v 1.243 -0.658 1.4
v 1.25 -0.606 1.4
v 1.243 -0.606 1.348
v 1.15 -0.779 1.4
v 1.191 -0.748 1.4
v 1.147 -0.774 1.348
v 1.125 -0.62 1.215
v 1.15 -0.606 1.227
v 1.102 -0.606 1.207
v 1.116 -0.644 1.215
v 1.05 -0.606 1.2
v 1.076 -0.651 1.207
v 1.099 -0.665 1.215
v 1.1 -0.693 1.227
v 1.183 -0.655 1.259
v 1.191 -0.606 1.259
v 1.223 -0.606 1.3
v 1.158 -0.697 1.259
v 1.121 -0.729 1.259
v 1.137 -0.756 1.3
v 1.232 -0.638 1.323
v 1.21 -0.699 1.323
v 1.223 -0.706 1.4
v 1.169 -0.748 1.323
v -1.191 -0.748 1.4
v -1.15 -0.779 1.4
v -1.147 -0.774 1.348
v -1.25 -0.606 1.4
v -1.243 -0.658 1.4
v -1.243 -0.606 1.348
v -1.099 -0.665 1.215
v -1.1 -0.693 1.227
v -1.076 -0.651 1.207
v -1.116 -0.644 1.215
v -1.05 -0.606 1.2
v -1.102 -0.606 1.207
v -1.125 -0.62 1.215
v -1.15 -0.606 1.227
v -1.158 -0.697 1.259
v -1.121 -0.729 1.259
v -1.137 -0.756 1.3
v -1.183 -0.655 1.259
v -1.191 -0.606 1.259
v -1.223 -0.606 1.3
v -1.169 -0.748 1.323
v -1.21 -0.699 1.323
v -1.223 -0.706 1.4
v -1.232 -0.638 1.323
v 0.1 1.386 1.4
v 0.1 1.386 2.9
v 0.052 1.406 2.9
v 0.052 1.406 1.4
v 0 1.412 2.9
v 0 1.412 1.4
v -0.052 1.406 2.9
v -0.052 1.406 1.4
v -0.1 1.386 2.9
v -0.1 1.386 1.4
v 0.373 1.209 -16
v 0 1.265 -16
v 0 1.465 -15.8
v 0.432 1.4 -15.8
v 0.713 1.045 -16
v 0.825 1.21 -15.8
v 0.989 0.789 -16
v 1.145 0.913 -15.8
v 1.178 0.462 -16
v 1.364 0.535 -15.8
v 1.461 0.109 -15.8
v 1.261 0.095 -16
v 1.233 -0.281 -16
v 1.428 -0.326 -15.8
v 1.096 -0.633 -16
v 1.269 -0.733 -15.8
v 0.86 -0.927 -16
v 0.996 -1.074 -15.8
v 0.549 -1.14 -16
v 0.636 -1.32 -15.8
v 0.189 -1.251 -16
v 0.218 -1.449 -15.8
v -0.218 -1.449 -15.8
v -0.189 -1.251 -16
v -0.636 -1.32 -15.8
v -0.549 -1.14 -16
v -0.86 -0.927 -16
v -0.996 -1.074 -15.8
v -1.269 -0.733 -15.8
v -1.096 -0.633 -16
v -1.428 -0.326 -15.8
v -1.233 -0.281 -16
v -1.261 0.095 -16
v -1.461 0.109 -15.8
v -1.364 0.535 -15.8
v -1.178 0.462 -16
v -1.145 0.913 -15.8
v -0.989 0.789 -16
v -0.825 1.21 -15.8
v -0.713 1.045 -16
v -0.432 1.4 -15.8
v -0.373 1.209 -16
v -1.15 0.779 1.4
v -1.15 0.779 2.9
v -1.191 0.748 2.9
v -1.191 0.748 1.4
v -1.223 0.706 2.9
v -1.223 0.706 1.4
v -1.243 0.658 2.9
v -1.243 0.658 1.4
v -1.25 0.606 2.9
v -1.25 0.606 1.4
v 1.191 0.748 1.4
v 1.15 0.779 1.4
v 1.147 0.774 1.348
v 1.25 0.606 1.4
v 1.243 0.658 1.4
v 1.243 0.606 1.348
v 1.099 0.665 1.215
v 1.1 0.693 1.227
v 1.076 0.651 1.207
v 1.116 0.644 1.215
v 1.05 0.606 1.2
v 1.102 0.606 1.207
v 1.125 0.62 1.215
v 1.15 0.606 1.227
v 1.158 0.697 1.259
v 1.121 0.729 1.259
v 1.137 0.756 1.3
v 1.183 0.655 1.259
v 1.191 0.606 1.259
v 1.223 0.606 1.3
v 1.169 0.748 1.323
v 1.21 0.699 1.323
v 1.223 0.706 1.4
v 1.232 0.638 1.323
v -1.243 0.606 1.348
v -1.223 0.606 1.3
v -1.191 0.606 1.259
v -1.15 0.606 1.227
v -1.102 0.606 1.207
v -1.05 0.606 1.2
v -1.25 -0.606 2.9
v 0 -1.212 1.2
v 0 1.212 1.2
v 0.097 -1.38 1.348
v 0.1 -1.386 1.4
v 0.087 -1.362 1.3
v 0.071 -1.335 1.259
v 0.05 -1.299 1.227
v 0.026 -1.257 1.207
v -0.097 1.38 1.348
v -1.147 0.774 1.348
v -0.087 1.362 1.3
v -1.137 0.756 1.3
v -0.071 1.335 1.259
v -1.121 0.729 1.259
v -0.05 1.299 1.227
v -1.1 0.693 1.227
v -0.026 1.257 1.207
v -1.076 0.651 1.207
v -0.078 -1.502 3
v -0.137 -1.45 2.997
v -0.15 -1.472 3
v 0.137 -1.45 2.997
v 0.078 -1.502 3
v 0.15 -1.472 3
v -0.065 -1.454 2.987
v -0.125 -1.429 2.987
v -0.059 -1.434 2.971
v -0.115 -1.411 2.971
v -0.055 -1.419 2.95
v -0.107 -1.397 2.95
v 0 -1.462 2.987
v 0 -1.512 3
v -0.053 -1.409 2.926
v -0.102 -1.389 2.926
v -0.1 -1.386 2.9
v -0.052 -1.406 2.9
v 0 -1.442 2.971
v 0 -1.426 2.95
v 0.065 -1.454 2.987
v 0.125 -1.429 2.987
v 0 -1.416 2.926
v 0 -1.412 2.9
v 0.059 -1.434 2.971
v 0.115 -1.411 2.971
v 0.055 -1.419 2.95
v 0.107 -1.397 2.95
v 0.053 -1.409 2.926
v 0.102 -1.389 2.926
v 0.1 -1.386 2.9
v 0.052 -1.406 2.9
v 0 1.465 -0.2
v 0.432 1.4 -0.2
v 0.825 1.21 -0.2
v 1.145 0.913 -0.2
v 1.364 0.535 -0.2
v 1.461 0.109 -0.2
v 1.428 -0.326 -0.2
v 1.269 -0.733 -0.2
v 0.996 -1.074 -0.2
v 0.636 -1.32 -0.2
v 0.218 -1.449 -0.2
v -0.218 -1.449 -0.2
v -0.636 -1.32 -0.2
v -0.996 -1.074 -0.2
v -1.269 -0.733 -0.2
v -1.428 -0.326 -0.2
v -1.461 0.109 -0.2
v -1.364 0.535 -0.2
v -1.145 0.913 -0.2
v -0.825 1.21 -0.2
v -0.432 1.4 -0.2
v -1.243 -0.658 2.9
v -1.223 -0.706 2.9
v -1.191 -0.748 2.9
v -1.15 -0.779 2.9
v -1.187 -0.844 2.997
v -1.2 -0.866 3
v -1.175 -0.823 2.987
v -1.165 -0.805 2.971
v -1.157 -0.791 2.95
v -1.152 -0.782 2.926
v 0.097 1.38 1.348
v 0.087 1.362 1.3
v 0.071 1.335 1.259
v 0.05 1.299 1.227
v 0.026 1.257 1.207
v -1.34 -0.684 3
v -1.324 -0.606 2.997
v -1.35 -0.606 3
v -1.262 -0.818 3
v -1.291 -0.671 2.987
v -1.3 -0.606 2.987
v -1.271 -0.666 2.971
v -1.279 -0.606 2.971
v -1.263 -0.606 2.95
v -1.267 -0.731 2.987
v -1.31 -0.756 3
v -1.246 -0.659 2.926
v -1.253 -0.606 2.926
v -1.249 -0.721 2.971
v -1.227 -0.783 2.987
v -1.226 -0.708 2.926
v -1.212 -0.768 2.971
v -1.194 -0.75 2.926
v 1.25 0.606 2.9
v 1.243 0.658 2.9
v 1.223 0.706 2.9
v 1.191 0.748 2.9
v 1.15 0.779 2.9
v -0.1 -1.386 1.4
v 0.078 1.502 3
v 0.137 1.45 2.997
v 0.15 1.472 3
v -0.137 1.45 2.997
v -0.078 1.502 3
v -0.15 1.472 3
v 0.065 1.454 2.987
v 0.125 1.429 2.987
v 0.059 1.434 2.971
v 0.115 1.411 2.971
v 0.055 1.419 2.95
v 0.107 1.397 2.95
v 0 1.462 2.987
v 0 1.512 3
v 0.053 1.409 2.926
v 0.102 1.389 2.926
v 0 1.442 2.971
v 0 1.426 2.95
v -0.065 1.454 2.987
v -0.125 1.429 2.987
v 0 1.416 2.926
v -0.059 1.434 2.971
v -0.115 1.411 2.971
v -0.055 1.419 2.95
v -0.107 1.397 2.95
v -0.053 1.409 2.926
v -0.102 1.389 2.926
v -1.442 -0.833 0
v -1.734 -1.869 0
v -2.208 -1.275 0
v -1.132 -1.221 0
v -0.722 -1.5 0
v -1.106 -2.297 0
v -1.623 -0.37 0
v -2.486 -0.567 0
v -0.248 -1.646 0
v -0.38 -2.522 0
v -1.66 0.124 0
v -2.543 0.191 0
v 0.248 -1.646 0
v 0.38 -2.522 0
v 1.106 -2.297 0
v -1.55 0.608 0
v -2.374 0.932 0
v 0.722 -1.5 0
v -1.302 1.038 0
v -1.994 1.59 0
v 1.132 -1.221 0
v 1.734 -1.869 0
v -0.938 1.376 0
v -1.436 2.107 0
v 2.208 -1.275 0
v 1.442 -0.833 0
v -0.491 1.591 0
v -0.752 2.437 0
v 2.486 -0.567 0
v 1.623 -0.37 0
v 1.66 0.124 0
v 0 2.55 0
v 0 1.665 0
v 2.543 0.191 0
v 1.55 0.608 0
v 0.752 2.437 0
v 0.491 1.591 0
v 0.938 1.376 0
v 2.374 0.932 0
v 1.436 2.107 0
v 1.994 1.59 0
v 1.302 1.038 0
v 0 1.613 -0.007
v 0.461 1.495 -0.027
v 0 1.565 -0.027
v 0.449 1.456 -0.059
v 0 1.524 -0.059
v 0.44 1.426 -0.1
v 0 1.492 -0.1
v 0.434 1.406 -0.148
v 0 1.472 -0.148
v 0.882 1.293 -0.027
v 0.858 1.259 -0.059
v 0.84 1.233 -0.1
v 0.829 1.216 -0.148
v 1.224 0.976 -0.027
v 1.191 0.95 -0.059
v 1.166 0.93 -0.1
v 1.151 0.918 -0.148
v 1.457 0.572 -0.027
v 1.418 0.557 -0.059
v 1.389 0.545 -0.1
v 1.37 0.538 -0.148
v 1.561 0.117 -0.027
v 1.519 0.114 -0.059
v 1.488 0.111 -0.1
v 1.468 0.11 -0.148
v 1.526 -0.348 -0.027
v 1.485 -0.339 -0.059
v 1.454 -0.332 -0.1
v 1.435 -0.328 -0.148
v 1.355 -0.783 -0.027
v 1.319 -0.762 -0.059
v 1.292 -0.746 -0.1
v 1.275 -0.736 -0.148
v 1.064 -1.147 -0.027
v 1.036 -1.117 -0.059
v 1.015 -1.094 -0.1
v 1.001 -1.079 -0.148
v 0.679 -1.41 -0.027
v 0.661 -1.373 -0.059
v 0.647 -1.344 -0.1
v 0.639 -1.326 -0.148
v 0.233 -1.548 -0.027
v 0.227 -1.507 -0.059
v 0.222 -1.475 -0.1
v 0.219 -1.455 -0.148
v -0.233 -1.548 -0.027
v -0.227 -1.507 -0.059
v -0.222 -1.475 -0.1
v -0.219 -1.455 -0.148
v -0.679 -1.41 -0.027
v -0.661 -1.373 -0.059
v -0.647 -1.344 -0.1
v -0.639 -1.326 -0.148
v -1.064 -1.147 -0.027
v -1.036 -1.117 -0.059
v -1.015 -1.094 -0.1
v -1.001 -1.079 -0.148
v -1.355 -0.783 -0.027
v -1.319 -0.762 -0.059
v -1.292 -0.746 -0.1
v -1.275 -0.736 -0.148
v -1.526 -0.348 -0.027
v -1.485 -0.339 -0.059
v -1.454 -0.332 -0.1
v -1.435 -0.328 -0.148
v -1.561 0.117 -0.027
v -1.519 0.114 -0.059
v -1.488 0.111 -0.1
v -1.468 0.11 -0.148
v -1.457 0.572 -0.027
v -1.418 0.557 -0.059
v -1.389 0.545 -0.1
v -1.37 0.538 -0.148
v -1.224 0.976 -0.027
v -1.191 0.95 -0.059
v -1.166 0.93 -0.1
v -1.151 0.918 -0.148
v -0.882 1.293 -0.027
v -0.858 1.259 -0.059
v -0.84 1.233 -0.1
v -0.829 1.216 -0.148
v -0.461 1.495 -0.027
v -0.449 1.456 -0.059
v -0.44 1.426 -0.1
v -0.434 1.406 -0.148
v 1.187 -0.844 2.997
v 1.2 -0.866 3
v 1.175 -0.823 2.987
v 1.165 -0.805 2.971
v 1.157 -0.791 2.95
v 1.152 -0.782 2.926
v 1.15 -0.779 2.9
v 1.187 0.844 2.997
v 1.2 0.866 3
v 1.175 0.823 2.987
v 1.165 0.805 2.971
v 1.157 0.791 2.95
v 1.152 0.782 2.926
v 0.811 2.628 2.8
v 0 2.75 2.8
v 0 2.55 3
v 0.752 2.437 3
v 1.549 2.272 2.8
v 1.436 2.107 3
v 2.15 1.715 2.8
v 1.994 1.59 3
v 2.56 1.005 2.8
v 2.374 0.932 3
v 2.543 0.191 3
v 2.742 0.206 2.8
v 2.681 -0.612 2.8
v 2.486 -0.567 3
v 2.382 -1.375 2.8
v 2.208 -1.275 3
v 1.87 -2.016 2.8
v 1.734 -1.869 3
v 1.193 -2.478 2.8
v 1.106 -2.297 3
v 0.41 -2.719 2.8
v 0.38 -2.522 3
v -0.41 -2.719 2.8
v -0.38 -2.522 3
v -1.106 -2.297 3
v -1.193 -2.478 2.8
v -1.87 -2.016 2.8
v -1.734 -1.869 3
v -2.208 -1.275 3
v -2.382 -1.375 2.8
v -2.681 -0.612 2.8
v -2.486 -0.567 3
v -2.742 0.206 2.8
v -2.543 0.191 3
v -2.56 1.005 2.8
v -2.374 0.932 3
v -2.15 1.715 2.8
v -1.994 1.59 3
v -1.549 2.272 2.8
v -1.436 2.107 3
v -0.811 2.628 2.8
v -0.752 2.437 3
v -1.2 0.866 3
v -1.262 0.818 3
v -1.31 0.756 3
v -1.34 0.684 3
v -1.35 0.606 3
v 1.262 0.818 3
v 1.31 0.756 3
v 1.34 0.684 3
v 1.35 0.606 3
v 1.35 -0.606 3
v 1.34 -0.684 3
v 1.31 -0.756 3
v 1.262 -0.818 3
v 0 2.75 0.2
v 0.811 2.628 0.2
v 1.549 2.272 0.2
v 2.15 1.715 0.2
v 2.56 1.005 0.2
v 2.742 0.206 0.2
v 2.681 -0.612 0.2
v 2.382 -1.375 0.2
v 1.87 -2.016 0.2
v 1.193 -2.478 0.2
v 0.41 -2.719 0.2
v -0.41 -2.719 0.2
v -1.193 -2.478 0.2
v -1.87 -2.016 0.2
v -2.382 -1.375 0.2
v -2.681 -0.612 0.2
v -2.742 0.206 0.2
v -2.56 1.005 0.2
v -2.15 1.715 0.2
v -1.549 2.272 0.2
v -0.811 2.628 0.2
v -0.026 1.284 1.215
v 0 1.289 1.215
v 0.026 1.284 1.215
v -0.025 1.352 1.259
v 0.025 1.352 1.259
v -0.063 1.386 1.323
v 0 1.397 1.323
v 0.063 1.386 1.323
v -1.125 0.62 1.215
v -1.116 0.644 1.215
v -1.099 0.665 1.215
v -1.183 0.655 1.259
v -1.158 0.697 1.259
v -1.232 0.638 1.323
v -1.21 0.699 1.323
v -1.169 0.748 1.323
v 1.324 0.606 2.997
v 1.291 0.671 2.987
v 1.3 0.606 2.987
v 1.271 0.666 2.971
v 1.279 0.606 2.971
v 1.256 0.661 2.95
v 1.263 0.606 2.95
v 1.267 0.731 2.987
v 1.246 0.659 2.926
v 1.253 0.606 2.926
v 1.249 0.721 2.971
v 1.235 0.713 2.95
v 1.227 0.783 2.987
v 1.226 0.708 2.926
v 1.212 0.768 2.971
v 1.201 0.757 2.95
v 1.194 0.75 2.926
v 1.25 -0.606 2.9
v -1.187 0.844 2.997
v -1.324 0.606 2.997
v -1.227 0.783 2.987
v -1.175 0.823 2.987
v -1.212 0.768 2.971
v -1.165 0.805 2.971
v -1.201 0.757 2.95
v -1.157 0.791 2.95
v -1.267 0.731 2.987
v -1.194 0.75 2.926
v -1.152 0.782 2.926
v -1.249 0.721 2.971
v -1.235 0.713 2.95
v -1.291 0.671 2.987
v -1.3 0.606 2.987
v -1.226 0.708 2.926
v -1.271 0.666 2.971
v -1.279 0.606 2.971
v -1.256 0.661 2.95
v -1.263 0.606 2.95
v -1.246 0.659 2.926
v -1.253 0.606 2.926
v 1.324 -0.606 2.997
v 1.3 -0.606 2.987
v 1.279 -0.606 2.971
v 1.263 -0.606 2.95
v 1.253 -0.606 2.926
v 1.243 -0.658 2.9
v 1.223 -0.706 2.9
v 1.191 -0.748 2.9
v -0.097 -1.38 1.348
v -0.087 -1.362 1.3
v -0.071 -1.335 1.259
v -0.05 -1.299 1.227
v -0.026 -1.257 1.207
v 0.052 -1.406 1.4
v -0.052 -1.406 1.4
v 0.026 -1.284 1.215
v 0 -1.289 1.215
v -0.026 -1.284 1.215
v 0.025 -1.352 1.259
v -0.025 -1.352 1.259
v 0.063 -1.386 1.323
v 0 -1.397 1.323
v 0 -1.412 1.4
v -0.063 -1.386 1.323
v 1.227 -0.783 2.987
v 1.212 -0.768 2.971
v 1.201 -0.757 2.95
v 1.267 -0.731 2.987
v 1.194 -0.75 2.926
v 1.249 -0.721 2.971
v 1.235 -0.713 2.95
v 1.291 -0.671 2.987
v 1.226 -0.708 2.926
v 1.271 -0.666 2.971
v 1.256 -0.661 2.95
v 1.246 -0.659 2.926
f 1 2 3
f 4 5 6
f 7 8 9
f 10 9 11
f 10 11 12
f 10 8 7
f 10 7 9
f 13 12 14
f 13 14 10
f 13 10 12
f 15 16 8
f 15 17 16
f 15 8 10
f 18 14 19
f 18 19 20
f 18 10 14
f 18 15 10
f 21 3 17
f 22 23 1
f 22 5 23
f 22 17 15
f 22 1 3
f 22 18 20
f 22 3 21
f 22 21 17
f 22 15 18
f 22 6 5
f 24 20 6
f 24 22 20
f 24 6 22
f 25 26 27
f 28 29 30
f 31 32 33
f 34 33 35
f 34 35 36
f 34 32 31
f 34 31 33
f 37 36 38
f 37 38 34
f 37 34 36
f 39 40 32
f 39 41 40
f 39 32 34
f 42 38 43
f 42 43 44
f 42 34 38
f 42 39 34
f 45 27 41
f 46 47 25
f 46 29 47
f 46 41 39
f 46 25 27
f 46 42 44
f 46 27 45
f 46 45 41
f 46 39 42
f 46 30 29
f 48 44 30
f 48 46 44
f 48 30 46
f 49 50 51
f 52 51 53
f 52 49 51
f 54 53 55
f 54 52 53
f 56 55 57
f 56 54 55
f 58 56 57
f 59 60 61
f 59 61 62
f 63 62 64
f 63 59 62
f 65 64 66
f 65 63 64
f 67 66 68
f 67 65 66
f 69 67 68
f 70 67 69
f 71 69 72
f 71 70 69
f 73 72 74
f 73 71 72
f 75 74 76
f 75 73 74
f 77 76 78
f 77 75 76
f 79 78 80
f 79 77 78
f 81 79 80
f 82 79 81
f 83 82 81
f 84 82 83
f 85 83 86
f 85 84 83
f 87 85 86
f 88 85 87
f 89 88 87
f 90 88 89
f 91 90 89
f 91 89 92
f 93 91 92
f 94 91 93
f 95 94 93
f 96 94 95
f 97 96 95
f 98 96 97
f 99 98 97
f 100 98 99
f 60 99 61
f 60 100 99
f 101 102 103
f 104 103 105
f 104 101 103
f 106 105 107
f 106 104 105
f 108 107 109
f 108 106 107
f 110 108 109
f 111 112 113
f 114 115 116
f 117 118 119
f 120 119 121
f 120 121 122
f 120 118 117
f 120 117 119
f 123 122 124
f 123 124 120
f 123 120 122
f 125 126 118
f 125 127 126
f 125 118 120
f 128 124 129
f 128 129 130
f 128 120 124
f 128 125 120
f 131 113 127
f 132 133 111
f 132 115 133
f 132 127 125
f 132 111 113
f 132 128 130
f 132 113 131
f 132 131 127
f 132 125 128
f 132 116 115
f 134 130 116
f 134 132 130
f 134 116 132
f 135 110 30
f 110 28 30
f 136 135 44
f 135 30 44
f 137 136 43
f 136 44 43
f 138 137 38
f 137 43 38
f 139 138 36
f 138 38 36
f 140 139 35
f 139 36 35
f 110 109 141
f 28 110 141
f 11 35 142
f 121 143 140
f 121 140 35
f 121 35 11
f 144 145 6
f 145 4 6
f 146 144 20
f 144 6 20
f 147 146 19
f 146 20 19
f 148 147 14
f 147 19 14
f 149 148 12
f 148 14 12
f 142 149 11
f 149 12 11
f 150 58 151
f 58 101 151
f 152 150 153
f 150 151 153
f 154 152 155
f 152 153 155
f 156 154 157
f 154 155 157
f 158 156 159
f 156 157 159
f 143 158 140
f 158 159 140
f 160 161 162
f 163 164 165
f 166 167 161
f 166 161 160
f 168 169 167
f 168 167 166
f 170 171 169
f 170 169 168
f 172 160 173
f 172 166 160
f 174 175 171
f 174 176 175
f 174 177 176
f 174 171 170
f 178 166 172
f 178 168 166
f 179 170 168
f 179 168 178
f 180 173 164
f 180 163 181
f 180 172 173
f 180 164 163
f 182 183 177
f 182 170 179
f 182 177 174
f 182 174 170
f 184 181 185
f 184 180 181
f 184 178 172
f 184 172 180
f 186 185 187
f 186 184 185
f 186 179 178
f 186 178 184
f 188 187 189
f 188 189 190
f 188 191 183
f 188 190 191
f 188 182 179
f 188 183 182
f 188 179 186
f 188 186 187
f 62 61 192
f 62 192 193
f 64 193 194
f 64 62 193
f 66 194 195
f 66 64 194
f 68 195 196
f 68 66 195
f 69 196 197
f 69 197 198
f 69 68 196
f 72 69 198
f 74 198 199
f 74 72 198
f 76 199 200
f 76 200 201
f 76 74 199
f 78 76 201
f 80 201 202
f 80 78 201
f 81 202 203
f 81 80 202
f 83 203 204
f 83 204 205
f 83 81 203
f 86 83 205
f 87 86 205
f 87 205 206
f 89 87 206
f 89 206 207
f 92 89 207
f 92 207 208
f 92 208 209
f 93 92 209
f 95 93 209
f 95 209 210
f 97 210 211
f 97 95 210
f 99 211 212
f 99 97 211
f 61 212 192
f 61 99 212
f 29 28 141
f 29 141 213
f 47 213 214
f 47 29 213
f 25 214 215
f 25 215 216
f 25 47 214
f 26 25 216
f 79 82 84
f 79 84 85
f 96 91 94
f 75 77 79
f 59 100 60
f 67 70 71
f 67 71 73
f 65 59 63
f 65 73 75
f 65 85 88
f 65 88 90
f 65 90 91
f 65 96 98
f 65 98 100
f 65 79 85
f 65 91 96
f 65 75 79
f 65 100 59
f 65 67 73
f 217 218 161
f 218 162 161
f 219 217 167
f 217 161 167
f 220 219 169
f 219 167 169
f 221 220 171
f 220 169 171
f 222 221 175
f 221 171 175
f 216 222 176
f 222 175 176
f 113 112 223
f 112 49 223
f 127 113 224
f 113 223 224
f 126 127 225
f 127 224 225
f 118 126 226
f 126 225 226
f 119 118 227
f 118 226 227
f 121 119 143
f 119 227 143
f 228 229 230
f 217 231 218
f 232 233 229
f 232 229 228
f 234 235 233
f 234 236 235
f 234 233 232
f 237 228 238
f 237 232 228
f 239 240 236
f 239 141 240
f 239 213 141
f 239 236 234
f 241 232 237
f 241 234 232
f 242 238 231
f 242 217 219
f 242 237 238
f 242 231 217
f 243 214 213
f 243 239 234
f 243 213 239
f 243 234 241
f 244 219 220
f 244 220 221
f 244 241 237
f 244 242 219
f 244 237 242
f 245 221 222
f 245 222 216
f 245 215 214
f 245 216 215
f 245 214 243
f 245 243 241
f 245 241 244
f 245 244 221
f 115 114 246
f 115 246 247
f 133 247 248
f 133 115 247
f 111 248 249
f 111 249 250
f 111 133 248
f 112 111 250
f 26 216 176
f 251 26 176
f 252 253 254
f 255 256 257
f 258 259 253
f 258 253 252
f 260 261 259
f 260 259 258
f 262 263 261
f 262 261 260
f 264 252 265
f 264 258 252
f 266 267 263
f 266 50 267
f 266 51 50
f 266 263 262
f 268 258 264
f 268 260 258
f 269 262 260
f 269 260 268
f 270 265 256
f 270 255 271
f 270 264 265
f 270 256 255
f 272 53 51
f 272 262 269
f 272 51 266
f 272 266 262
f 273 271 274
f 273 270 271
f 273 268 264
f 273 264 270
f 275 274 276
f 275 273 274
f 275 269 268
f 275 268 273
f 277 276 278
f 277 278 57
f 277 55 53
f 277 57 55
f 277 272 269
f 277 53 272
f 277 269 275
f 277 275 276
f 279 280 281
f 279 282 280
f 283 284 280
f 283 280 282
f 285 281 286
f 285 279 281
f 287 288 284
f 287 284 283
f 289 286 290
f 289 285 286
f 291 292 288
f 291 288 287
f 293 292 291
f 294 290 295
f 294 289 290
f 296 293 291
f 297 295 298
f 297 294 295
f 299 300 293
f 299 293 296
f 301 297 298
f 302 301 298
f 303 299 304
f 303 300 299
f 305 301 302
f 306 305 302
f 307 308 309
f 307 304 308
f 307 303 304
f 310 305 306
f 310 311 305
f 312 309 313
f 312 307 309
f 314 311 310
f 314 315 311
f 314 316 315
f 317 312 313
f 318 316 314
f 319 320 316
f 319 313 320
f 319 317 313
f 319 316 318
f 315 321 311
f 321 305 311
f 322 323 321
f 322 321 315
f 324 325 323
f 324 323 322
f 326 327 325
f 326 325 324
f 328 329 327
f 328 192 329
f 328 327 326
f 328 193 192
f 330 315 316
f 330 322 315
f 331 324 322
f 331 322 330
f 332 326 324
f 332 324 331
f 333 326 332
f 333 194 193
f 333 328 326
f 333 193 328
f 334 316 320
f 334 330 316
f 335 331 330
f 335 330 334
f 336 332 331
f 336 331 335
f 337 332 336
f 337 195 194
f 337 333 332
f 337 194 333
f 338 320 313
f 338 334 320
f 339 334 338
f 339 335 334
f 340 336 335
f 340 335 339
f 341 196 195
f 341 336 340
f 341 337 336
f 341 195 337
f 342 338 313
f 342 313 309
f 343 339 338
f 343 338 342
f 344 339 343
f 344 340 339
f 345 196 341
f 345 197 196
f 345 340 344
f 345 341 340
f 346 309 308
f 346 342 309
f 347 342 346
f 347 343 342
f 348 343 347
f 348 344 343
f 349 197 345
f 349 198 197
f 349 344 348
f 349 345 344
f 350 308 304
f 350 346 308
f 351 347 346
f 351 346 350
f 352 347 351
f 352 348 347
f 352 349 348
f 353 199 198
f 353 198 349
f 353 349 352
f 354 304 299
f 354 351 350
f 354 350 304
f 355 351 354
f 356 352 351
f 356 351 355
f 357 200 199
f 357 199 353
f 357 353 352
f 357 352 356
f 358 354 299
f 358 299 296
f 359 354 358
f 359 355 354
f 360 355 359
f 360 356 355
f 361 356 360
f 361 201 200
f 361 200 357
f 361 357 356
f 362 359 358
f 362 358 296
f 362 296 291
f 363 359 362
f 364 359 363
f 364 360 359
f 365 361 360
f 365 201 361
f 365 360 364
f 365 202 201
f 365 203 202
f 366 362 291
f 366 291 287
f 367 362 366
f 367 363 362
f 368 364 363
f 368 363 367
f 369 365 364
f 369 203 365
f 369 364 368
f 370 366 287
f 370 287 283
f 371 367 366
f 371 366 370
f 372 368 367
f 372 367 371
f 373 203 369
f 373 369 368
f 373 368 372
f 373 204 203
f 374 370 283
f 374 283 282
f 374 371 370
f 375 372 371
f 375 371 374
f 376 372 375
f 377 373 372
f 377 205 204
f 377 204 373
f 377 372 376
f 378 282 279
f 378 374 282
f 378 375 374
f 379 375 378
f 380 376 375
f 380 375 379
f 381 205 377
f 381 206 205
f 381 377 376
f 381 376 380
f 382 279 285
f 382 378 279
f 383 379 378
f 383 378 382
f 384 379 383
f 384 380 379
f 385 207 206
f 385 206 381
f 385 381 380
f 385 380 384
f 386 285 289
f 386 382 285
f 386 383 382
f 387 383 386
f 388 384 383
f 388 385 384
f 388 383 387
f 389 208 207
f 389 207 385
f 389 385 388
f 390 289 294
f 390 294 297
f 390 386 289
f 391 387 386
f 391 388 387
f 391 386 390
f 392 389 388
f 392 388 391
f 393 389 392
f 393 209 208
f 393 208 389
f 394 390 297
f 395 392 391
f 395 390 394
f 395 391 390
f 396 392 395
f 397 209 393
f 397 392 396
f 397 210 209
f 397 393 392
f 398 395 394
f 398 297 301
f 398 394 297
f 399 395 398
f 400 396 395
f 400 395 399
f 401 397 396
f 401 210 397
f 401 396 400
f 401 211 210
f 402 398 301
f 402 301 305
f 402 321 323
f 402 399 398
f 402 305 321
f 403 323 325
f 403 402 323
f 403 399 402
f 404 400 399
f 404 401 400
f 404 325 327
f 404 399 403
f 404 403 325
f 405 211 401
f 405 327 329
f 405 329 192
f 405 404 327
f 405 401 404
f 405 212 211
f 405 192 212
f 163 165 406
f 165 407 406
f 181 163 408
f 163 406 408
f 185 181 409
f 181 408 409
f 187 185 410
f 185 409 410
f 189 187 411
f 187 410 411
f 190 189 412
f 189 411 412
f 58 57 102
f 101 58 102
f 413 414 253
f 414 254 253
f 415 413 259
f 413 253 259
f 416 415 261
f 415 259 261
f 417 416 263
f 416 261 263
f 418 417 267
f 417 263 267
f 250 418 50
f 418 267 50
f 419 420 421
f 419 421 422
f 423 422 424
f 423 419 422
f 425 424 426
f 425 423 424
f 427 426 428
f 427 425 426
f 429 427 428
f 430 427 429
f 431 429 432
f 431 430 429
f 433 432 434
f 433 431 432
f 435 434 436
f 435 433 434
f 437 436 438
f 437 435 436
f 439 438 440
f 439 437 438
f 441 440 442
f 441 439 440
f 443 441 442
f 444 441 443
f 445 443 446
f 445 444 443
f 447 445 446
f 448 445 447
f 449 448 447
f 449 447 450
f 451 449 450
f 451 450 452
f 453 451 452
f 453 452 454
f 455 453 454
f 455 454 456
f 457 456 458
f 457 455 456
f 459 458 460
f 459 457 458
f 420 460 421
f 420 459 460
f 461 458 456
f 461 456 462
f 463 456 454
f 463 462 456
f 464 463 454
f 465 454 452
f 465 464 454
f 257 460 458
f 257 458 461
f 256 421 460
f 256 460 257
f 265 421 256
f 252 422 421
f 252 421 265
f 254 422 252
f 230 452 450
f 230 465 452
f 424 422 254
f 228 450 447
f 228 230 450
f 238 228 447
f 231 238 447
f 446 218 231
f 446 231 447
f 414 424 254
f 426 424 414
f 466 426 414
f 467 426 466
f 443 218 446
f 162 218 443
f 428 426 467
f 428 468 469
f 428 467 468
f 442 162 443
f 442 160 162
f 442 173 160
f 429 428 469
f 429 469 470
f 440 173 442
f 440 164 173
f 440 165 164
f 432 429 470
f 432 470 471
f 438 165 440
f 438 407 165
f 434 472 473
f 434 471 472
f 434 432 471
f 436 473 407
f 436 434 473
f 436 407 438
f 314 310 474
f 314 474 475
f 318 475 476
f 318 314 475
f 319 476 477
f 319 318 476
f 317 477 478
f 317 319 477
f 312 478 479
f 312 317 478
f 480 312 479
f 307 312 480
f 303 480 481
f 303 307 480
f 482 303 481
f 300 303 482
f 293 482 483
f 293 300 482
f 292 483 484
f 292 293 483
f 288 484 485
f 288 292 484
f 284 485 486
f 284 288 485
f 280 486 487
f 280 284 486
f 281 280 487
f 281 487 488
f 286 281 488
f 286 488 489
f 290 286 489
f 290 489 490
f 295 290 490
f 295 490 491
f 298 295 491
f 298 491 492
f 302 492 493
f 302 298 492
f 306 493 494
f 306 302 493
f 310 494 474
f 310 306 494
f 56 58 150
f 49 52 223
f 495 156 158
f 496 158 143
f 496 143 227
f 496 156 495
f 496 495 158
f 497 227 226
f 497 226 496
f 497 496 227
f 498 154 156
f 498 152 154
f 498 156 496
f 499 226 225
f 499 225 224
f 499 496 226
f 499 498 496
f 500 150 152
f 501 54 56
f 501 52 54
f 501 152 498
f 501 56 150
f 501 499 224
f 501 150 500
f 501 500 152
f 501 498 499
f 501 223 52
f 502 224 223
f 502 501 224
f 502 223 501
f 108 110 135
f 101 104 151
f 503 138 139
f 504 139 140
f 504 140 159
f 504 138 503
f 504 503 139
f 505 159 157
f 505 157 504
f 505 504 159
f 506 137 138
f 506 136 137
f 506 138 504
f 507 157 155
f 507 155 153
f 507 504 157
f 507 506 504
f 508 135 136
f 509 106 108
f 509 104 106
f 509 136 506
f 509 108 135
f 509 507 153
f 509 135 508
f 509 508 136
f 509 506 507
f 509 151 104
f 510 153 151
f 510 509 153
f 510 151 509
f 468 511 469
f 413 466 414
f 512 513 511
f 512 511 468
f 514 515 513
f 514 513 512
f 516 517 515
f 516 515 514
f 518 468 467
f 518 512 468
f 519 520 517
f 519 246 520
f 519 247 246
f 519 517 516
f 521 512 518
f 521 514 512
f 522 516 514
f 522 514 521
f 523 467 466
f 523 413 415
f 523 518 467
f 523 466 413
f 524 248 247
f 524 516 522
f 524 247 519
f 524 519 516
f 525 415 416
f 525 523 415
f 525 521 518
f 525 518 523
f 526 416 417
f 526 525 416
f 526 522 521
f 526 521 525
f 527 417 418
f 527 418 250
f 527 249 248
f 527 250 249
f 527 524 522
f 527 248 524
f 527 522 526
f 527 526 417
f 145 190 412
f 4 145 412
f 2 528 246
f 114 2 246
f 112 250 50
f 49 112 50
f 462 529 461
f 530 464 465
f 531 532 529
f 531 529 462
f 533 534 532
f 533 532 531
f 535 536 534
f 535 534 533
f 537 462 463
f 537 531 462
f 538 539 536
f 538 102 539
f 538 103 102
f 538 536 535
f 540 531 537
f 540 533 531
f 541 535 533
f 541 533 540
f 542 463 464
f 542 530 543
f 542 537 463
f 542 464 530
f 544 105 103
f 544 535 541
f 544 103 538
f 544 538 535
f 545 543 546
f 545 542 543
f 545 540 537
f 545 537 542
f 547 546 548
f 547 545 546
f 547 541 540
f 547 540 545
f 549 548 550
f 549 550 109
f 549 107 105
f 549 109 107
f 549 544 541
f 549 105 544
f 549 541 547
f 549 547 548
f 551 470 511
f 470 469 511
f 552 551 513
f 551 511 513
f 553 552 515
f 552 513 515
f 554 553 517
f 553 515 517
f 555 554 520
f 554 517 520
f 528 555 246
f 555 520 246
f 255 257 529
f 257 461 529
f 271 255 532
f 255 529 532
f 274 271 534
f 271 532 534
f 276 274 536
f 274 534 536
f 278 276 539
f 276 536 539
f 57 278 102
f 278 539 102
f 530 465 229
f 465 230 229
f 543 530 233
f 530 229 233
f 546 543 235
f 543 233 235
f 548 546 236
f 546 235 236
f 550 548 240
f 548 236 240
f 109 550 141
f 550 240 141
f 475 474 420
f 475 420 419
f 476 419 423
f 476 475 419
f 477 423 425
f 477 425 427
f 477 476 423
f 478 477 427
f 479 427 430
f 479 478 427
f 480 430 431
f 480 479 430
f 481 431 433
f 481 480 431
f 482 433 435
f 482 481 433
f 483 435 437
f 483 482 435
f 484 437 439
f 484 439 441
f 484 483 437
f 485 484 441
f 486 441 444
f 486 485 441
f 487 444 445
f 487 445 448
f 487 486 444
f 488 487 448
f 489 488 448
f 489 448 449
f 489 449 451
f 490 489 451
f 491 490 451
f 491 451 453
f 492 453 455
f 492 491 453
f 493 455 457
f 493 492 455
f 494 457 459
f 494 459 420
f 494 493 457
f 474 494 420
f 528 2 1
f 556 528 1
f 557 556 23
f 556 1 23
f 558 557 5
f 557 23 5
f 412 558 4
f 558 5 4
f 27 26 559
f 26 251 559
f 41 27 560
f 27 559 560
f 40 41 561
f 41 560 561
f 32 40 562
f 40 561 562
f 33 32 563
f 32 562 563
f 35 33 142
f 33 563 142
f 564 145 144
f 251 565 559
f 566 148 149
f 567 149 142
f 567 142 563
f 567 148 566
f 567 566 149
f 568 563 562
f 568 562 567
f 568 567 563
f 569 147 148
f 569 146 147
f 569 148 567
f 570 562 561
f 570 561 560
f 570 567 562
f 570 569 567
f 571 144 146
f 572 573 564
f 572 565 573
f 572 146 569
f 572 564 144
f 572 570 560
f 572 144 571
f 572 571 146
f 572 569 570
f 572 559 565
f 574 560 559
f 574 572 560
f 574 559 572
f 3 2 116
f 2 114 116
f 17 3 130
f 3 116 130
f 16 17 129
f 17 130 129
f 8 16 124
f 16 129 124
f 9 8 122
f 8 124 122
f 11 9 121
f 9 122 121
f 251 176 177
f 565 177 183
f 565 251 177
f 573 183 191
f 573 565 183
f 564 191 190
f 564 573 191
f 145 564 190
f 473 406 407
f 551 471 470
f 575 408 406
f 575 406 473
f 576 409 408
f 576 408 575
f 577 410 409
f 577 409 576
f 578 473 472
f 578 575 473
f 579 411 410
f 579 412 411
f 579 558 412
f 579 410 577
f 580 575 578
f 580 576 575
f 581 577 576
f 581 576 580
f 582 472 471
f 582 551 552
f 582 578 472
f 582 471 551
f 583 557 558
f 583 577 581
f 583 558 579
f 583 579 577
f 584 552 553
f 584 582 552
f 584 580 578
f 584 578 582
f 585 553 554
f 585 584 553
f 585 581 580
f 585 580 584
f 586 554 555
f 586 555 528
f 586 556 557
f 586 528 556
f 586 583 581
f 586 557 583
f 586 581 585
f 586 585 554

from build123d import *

# Parameters (mm, degrees)
SCHNITT_LINEAR_AUSTRAGEN1_DEPTH = 1.8
FASE1_SIZE                      = 0.2
VERRUNDUNG1_R                   = 0.2
VERRUNDUNG2_R                   = 0.1


with BuildPart() as part:
    # Skizze1 → Rotation1 (revolve)
    with BuildSketch(Plane(origin=(0, 0, 0), x_dir=(0, 0, -1), z_dir=(1, 0, 0))):
        Polygon((-3, 0), (-3, 2.75), (0, 2.75), (0, 1.465), (16, 1.465), (16, 0), align=None)
    revolve(axis=Axis((0, 0, 21.919879518), (0, 0, -1)))

    # Skizze2 → Schnitt-Linear austragen1 (cut)
    with BuildSketch(Plane.XY.offset(3)):
        Polygon((1.25, -0.721687836), (1.25, 0.721687836), (0, 1.443375673), (-1.25, 0.721687836), (-1.25, -0.721687836), (0, -1.443375673), align=None)
    extrude(amount=-SCHNITT_LINEAR_AUSTRAGEN1_DEPTH, mode=Mode.SUBTRACT)

    # Fase1
    fase1_edges = [part.edges().sort_by_distance(p)[0] for p in [
        (0, -1.465, -16),
        (0, -2.75, 0),
        (0, -2.75, 3),
    ]]
    chamfer(fase1_edges, length=FASE1_SIZE)

    # Verrundung1
    verrundung1_edges = [part.edges().sort_by_distance(p)[0] for p in [
        (0.625, -1.082531755, 1.2),
        (1.25, -0.721687836, 2.1),
        (-0.625, -1.082531755, 1.2),
        (0, -1.443375673, 2.1),
        (-1.25, 0, 1.2),
        (-1.25, -0.721687836, 2.1),
        (-0.625, 1.082531755, 1.2),
        (-1.25, 0.721687836, 2.1),
        (0.625, 1.082531755, 1.2),
        (0, 1.443375673, 2.1),
        (1.25, 0, 1.2),
        (1.25, 0.721687836, 2.1),
        (0, -1.465, 0),
    ]]
    fillet(verrundung1_edges, radius=VERRUNDUNG1_R)

    # Verrundung2
    verrundung2_edges = [part.edges().sort_by_distance(p)[0] for p in [
        (-0.625, -1.082531755, 3),
        (-1.25, 0, 3),
        (-0.625, 1.082531755, 3),
        (0.625, 1.082531755, 3),
        (1.25, 0, 3),
        (0.625, -1.082531755, 3),
        (-1.223205081, -0.706217783, 3),
        (0, -1.412435565, 3),
        (1.223205081, -0.706217783, 3),
        (1.223205081, 0.706217783, 3),
        (0, 1.412435565, 3),
        (-1.223205081, 0.706217783, 3),
    ]]
    fillet(verrundung2_edges, radius=VERRUNDUNG2_R)


solid = part.part
